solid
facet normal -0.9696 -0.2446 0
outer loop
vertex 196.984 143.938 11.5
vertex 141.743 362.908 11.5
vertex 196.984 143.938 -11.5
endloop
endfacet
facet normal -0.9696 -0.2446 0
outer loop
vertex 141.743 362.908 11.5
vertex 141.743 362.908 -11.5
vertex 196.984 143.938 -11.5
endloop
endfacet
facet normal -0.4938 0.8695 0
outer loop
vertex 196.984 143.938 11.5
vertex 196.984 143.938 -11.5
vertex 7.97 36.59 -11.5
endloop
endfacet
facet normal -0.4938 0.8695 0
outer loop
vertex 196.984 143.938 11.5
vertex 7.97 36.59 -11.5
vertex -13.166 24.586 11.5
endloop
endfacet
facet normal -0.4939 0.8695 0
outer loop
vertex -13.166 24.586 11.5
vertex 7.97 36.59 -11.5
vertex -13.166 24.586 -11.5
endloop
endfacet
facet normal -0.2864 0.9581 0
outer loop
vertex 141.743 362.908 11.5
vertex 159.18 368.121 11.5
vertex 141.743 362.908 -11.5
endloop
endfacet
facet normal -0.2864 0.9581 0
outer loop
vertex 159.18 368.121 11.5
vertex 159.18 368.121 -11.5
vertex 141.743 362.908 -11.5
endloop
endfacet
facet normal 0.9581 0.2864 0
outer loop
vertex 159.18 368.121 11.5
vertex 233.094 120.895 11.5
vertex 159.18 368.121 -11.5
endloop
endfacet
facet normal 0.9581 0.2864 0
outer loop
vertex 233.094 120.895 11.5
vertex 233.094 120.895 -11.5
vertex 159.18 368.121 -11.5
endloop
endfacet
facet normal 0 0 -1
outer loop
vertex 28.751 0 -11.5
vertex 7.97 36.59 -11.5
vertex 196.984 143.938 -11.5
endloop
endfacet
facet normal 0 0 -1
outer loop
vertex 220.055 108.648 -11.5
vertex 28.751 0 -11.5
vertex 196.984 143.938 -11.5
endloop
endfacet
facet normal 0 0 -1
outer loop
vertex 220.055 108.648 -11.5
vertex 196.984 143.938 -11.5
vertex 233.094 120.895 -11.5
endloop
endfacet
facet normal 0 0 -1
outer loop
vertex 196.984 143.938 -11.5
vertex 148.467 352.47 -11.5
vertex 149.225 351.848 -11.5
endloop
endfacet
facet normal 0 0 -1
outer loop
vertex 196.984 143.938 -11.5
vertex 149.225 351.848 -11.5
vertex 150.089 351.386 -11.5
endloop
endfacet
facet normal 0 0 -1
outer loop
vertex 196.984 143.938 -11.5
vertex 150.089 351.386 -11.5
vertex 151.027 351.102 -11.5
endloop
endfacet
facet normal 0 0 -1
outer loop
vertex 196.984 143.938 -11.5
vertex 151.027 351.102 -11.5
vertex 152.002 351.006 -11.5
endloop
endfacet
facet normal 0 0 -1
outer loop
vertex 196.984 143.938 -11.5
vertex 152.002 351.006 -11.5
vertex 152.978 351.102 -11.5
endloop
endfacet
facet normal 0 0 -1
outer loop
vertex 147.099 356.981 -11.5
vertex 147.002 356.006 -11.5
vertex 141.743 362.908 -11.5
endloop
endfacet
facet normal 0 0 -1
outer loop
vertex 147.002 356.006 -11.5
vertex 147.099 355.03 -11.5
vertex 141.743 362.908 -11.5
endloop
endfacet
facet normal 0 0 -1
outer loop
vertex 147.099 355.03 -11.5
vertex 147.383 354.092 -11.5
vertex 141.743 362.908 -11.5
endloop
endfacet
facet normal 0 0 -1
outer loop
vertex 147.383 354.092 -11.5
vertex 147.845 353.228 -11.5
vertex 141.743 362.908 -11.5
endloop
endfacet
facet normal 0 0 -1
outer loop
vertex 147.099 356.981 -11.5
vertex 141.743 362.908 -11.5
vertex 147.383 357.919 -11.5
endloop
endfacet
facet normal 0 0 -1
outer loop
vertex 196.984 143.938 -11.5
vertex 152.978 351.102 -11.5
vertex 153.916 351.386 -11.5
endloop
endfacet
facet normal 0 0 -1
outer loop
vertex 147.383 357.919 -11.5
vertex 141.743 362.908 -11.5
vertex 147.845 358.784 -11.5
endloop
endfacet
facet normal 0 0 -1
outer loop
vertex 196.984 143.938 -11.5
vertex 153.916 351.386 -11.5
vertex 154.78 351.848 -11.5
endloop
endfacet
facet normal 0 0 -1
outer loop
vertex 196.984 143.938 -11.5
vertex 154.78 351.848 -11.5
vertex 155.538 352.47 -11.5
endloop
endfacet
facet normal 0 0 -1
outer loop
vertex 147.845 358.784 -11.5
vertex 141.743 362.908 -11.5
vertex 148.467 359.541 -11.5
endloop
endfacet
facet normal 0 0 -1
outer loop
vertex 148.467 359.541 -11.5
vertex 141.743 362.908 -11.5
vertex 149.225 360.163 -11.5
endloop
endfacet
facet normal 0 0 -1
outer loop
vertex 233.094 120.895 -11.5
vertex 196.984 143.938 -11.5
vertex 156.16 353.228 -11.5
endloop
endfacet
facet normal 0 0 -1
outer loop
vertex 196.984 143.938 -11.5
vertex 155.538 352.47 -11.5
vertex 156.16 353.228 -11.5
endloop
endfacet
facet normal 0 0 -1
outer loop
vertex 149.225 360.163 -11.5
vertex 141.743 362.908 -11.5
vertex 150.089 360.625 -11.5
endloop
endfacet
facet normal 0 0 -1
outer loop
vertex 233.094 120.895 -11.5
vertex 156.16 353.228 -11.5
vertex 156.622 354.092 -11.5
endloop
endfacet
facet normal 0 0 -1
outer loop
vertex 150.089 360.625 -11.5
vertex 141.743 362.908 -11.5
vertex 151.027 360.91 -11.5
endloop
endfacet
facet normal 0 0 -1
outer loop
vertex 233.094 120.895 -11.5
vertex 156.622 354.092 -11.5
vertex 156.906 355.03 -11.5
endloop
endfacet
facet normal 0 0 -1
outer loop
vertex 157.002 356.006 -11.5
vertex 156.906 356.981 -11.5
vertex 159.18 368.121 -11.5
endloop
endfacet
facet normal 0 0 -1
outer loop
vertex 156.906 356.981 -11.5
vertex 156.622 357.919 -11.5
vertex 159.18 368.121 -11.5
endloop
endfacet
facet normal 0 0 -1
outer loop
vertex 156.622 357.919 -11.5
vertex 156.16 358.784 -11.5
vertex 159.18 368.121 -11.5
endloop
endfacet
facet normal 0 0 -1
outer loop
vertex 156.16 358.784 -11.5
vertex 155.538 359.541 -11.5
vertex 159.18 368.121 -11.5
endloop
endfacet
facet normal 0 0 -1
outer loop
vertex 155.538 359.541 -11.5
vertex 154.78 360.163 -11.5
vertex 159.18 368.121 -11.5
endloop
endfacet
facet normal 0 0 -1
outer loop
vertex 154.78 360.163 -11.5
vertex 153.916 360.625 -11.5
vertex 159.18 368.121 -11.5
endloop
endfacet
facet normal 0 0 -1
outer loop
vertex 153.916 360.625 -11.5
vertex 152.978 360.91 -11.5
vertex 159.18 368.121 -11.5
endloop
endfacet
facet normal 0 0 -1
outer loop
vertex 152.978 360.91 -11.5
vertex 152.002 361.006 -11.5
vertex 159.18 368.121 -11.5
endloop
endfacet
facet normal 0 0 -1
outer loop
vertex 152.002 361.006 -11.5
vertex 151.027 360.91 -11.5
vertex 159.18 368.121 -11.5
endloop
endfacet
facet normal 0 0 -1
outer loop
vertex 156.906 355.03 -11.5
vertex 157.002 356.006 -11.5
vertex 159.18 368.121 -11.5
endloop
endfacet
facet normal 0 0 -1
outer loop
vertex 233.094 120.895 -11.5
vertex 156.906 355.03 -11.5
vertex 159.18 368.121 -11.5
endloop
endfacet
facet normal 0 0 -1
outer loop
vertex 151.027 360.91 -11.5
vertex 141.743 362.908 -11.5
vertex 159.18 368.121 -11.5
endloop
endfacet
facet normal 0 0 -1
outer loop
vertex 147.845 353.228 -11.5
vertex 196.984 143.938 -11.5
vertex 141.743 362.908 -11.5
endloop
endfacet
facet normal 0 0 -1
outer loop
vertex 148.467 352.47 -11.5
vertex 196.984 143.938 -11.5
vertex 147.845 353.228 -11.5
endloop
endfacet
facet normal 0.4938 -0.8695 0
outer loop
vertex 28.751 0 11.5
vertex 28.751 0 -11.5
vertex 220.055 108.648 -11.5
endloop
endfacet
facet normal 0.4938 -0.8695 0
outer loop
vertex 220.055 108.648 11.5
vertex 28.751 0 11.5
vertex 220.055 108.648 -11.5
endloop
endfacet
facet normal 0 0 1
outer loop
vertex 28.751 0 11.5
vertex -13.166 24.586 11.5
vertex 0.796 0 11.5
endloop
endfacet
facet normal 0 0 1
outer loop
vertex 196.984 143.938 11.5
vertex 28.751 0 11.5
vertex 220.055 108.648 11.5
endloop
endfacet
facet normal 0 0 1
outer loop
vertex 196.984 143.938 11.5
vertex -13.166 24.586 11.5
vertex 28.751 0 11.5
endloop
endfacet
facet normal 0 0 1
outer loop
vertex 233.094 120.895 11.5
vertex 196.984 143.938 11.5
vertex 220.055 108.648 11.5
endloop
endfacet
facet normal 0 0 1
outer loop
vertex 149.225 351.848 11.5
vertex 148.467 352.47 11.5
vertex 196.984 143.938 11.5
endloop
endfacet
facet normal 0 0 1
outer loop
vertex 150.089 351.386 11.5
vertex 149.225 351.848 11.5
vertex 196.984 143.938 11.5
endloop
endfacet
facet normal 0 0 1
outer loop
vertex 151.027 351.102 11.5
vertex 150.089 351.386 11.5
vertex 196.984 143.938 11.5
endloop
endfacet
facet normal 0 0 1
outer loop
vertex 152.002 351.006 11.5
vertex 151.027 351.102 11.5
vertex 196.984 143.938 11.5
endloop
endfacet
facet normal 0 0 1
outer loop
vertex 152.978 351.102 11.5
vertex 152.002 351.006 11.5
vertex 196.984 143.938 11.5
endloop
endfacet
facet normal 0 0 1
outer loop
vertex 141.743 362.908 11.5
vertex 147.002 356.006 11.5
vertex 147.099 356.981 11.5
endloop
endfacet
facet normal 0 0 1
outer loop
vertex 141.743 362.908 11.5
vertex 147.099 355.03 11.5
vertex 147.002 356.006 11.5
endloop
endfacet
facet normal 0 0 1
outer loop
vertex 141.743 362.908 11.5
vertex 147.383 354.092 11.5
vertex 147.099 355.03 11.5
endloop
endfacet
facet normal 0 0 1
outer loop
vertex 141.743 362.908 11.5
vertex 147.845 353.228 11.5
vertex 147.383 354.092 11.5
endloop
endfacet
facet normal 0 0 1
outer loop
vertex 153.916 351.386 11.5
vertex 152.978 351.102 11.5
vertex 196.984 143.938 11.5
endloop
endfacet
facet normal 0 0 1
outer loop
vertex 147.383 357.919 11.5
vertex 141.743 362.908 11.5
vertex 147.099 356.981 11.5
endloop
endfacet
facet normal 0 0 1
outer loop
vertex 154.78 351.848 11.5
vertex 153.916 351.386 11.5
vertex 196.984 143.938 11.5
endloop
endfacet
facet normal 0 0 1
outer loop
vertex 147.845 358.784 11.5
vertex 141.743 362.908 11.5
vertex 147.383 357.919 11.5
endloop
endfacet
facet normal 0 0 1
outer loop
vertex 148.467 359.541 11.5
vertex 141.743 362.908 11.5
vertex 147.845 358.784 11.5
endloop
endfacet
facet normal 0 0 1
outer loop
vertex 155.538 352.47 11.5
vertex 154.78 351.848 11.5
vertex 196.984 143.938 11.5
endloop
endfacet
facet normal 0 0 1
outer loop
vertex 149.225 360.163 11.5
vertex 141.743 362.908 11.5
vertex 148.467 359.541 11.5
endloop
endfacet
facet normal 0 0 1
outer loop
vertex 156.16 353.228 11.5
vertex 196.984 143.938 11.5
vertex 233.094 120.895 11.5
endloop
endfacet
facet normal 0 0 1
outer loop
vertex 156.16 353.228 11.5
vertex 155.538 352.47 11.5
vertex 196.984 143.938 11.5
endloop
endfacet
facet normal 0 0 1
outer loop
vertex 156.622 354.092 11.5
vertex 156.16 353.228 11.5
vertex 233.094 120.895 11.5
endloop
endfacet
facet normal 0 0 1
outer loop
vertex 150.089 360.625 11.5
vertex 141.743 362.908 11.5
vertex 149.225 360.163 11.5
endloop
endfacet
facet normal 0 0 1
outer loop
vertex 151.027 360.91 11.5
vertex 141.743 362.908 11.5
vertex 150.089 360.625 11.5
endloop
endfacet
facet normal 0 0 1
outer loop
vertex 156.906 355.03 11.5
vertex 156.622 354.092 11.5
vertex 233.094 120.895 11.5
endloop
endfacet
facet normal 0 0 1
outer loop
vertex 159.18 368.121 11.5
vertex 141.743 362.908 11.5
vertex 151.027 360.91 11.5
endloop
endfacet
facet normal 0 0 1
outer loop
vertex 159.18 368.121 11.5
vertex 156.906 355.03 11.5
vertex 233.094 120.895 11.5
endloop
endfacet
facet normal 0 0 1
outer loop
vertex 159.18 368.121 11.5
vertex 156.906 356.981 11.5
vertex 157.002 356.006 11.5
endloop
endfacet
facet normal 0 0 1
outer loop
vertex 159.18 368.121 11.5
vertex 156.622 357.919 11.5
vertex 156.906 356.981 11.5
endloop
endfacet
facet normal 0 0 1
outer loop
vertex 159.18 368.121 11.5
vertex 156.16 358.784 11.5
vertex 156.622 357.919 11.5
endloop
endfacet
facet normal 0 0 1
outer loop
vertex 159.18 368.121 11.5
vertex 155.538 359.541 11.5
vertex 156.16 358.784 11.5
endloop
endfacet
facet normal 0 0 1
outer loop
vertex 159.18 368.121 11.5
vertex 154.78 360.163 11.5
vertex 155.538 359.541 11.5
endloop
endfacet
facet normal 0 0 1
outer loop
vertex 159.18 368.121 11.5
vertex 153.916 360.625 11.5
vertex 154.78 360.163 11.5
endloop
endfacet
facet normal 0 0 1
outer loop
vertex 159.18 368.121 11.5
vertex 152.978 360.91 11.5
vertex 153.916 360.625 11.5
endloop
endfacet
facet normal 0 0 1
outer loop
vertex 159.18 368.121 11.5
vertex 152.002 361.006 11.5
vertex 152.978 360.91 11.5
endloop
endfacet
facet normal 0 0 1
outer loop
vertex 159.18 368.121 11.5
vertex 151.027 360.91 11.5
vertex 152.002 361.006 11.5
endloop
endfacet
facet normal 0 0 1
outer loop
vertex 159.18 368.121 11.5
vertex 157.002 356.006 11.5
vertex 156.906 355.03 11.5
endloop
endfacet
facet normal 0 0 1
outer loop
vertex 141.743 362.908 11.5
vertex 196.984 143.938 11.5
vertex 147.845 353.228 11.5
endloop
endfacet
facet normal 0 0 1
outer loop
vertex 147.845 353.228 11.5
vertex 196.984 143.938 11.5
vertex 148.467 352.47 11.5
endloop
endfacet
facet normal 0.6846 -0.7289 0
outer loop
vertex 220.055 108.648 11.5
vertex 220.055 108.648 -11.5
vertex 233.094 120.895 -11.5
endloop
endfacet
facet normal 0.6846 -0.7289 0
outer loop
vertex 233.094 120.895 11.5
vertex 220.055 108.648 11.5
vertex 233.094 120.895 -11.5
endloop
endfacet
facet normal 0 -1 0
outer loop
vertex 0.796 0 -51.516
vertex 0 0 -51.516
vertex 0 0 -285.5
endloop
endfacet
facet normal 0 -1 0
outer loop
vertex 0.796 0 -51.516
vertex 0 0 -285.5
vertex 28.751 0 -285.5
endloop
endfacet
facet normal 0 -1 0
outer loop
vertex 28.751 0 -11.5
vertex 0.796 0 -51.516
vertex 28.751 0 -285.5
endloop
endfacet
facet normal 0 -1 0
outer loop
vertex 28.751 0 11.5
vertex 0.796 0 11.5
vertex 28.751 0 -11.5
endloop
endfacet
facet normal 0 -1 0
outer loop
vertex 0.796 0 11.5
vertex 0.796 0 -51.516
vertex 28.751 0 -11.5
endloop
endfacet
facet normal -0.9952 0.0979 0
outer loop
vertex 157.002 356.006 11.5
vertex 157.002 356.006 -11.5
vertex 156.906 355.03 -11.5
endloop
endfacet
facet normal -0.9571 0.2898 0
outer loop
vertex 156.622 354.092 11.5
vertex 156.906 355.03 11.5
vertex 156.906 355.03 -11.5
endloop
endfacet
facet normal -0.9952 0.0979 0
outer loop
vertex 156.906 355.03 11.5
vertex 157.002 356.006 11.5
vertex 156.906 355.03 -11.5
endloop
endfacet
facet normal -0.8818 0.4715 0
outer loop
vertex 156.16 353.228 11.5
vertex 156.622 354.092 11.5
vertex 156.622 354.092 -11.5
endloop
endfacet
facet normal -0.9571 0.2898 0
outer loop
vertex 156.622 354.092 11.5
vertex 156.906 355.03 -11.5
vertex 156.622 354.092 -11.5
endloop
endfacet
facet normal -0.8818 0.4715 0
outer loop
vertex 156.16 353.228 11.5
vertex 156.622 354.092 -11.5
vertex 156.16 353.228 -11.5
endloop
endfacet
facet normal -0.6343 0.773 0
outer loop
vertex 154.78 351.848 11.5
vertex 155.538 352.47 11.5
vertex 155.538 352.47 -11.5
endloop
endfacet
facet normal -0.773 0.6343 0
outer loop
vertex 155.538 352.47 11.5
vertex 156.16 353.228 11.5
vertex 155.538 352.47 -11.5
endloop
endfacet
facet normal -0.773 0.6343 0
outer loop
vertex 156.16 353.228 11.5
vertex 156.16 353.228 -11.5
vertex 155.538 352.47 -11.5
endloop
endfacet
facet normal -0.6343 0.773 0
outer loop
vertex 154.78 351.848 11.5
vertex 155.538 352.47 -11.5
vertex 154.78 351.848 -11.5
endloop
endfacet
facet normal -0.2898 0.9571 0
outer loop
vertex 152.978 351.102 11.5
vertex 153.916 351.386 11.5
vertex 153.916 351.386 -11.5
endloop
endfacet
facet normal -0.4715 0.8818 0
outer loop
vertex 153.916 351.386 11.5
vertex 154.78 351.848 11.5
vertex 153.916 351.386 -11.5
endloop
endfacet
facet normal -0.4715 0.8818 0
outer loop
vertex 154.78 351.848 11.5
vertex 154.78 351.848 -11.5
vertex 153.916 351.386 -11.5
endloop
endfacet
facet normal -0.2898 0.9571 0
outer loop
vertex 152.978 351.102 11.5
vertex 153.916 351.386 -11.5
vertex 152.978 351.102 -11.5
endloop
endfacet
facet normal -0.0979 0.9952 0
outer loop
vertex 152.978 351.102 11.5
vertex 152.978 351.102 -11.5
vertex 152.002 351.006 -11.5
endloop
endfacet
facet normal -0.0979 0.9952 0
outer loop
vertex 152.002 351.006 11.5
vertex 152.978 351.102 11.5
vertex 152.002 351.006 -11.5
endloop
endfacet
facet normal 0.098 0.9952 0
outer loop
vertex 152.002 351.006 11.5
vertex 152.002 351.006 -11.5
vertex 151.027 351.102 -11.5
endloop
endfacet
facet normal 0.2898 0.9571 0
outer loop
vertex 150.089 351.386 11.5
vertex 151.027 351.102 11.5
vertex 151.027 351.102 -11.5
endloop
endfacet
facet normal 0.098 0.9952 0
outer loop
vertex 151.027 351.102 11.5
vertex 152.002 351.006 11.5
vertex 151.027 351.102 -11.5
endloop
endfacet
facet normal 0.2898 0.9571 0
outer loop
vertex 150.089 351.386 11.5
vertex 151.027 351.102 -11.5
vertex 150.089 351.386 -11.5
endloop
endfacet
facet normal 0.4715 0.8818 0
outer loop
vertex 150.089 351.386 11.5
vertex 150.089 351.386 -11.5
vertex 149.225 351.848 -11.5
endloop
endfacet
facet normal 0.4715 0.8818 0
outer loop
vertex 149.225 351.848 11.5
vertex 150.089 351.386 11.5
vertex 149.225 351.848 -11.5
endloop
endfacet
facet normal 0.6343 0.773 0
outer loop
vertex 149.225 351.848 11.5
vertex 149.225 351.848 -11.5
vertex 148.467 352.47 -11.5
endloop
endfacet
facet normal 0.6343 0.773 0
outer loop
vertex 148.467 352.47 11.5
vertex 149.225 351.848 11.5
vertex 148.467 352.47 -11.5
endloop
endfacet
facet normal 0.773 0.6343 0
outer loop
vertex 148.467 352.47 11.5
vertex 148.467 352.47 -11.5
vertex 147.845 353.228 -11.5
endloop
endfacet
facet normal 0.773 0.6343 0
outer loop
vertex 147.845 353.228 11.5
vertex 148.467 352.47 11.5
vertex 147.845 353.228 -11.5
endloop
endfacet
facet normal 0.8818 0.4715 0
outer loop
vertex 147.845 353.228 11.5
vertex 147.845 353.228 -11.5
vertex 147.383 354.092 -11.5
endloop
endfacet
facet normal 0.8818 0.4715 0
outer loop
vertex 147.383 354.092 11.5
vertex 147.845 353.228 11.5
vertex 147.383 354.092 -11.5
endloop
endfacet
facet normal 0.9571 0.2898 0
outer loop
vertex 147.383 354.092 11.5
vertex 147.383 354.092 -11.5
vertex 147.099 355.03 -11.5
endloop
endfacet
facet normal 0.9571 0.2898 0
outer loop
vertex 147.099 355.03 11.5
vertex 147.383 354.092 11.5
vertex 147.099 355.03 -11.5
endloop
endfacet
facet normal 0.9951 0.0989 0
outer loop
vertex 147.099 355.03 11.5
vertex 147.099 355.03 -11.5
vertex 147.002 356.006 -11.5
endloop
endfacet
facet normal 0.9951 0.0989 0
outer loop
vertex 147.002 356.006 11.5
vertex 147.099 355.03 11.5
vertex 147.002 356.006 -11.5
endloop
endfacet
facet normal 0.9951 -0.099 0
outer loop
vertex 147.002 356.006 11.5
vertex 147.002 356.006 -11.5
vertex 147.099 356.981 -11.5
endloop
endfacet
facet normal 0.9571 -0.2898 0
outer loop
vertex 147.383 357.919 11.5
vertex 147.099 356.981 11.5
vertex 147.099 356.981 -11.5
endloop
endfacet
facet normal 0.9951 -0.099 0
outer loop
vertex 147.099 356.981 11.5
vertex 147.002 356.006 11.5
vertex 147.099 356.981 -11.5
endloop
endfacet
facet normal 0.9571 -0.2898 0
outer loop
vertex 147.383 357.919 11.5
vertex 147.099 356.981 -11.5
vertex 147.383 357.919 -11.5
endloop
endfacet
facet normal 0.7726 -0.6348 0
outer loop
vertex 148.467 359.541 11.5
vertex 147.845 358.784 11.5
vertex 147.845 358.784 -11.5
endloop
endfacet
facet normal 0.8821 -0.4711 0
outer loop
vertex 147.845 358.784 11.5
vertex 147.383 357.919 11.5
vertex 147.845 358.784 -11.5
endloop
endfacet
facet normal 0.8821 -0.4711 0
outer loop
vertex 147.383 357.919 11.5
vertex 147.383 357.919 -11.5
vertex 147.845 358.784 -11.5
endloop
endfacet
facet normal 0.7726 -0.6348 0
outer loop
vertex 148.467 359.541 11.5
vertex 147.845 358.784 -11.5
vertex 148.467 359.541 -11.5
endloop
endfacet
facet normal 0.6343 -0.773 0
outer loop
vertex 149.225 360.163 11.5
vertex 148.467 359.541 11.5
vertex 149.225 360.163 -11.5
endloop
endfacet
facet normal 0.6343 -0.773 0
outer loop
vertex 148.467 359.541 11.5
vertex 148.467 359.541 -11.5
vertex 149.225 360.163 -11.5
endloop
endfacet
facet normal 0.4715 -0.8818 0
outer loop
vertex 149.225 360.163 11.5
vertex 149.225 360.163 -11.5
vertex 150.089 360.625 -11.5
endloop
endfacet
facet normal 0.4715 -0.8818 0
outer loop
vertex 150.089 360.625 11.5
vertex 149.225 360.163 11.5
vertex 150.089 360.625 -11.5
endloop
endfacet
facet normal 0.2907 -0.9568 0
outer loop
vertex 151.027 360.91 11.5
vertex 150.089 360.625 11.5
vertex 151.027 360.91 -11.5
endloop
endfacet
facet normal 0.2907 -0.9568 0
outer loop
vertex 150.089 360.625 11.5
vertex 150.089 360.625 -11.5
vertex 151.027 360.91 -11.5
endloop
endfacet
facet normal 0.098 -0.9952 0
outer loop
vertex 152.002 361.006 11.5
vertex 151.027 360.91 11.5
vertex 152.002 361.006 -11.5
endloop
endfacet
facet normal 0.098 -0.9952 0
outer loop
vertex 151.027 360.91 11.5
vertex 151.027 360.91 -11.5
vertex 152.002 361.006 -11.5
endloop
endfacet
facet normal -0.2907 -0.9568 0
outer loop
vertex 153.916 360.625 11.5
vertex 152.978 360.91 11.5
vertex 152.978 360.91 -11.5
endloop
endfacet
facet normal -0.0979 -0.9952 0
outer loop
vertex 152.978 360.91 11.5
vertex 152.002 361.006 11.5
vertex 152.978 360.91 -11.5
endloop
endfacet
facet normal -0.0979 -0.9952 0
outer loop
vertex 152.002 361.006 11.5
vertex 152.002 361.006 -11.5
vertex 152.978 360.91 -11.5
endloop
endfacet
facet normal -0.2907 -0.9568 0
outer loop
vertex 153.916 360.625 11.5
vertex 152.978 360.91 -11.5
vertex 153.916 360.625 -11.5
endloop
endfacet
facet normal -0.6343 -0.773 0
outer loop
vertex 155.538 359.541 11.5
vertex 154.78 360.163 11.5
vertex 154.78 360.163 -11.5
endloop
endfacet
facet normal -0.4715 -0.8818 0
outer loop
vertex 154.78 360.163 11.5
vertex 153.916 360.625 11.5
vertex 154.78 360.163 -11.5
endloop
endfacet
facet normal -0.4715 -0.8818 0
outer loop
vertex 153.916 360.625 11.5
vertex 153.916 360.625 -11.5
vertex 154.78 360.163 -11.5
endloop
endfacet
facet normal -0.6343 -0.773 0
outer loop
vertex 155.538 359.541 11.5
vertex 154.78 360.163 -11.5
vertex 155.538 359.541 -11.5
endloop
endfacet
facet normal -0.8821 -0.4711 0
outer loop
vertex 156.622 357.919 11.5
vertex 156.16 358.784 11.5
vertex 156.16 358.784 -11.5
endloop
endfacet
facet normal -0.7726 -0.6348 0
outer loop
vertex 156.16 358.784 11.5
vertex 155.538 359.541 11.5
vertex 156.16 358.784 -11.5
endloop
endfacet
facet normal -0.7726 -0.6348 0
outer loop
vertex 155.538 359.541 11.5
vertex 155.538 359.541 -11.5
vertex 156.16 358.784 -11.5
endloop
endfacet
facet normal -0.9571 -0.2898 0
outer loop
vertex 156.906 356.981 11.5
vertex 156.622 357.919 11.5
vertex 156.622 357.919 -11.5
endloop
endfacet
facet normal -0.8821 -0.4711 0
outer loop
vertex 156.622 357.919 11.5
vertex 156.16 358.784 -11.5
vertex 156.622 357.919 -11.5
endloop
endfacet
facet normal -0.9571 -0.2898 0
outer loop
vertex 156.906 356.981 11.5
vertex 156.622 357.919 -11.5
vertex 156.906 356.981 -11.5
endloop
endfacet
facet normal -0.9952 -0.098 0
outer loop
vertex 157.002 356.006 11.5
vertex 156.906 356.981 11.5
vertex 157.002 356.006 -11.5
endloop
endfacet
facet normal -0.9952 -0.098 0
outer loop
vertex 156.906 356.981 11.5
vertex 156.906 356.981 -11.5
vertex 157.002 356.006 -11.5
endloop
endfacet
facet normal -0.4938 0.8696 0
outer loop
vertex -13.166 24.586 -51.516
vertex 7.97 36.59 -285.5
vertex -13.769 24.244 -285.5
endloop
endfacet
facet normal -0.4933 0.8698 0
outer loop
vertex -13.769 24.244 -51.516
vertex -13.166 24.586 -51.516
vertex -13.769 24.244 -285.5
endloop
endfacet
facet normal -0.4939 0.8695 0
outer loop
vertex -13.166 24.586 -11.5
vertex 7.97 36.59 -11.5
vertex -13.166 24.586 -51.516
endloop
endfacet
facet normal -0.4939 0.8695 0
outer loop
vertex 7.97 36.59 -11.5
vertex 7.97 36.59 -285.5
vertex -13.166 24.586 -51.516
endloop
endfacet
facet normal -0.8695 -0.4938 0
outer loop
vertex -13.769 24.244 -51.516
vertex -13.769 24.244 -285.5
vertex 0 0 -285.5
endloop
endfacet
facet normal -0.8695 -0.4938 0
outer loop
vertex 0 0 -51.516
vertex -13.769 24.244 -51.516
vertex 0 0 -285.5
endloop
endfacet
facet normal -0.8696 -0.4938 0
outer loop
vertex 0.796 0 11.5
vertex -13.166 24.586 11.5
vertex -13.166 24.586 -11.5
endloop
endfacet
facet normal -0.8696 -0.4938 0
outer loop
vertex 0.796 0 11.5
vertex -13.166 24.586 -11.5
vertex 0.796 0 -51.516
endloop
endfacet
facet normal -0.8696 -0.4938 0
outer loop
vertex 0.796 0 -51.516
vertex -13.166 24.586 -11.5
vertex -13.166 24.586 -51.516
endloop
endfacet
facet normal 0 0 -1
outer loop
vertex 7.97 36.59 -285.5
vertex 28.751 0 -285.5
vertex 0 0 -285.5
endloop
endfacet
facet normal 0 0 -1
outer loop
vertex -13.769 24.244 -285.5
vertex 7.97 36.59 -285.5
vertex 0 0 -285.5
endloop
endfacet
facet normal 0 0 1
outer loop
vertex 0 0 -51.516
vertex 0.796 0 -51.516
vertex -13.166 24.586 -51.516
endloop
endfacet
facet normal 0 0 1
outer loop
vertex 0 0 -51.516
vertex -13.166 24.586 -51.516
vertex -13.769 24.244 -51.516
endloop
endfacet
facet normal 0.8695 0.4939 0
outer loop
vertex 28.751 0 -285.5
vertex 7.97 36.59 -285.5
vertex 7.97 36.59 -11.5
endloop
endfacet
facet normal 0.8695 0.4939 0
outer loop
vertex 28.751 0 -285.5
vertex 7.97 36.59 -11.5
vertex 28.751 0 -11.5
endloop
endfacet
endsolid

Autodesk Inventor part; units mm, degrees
ref_plane "YZ Plane" through (0, 0, 0) normal (1, 0, 0) x (0, 1, 0)
ref_plane "XZ Plane" through (0, 0, 0) normal (0, 1, 0) x (-1, 0, 0)
ref_plane "XY Plane" through (0, 0, 0) normal (0, 0, 1) x (1, 0, 0)
sketch "Sketch1" plane through (0, 0, 0) normal (0, 0, 1) x (1, 0, 0)
  circle A0 centre (152.0025, 356.0058) radius 5
  line L0 (28.751, 0) -> (220.0553, 108.6482)
  line L1 (220.0553, 108.6482) -> (233.0937, 120.8954)
  line L2 (233.0937, 120.8954) -> (159.1798, 368.1207)
  line L3 (159.1798, 368.1207) -> (141.7433, 362.9081)
  line L4 (141.7433, 362.9081) -> (196.9837, 143.9375)
  line L5 (196.9837, 143.9375) -> (-13.7687, 24.2435)
  line L6 (0, 0) -> (-13.7687, 24.2435)
  line L7 (0, 0) -> (28.751, 0)
  dimension "CHAMFER" = 28.751
  dimension "d1" = 60.406
  dimension "d2" = 29.594
  dimension "ARM_L" = 220.004
  dimension "ARM_L2" = 242.37
  dimension "ARM_VER_L" = 258.038
  dimension "ARM_VER_L2" = 225.831
  dimension "ARM_W2" = 18.199
  dimension "ARM_W" = 42.162
  dimension "PIN_HOLE" = 10
  dimension "d10" = 233.0937
  dimension "d11" = 120.8954
  dimension "d12" = 24.2435
  dimension "d13" = 13.7687
  dimension "d14" = 196.9837
  dimension "d15" = 220.0553
  dimension "d16" = 159.1798
  dimension "d17" = 152.0025
  dimension "d18" = 356.0058
extrude "Extrusion1" add sketch "Sketch1" along normal mid plane 23
sketch "Sketch2" plane through (0, 0, -11.5) normal (0, 0, -1) x (-1, 0, 0)
  line L0 (-7.9703, 36.5899) -> (13.7687, 24.2435)
  line L1 (13.7687, 24.2435) -> (-0.054, -0.0951)
  line L2 (0, 0) -> (-0.054, -0.0951)
  line L3 (0, 0) -> (-28.751, 0)
  line L4 (-7.9703, 36.5899) -> (-28.751, 0)
  line L5 (0, 0) -> (13.7687, 24.2435) projected
  line L6 (13.7687, 24.2435) -> (-196.9837, 143.9375) projected
  line L7 (-28.751, 0) -> (0, 0) projected
  point P0 (226.376, 276)
extrude "Extrusion2" add sketch "Sketch2" along normal blind 274
sketch "Sketch3" plane through (196.9837, 143.9375, 11.5) normal (-0.4938, 0.8695, 0) x (0.8695, 0.4938, 0)
  line L0 (-242.3701, 0) -> (-217.3697, 0) projected
  line L1 (-242.3701, 0) -> (-241.6771, 0)
  line L2 (-241.6771, 0) -> (-241.6771, 63.016)
  line L3 (-241.6771, 63.016) -> (-242.3701, 63.016)
  line L4 (-242.3701, 63.016) -> (-242.3701, 0)
  point P0 (-242.3701, 11.5)
  point P1 (-241.6771, 0)
  dimension "d23" = 63.016
  dimension "d24" = 0.693
extrude "Extrusion3" cut sketch "Sketch3" against normal blind 274
properties part number "grip - C2-1"
